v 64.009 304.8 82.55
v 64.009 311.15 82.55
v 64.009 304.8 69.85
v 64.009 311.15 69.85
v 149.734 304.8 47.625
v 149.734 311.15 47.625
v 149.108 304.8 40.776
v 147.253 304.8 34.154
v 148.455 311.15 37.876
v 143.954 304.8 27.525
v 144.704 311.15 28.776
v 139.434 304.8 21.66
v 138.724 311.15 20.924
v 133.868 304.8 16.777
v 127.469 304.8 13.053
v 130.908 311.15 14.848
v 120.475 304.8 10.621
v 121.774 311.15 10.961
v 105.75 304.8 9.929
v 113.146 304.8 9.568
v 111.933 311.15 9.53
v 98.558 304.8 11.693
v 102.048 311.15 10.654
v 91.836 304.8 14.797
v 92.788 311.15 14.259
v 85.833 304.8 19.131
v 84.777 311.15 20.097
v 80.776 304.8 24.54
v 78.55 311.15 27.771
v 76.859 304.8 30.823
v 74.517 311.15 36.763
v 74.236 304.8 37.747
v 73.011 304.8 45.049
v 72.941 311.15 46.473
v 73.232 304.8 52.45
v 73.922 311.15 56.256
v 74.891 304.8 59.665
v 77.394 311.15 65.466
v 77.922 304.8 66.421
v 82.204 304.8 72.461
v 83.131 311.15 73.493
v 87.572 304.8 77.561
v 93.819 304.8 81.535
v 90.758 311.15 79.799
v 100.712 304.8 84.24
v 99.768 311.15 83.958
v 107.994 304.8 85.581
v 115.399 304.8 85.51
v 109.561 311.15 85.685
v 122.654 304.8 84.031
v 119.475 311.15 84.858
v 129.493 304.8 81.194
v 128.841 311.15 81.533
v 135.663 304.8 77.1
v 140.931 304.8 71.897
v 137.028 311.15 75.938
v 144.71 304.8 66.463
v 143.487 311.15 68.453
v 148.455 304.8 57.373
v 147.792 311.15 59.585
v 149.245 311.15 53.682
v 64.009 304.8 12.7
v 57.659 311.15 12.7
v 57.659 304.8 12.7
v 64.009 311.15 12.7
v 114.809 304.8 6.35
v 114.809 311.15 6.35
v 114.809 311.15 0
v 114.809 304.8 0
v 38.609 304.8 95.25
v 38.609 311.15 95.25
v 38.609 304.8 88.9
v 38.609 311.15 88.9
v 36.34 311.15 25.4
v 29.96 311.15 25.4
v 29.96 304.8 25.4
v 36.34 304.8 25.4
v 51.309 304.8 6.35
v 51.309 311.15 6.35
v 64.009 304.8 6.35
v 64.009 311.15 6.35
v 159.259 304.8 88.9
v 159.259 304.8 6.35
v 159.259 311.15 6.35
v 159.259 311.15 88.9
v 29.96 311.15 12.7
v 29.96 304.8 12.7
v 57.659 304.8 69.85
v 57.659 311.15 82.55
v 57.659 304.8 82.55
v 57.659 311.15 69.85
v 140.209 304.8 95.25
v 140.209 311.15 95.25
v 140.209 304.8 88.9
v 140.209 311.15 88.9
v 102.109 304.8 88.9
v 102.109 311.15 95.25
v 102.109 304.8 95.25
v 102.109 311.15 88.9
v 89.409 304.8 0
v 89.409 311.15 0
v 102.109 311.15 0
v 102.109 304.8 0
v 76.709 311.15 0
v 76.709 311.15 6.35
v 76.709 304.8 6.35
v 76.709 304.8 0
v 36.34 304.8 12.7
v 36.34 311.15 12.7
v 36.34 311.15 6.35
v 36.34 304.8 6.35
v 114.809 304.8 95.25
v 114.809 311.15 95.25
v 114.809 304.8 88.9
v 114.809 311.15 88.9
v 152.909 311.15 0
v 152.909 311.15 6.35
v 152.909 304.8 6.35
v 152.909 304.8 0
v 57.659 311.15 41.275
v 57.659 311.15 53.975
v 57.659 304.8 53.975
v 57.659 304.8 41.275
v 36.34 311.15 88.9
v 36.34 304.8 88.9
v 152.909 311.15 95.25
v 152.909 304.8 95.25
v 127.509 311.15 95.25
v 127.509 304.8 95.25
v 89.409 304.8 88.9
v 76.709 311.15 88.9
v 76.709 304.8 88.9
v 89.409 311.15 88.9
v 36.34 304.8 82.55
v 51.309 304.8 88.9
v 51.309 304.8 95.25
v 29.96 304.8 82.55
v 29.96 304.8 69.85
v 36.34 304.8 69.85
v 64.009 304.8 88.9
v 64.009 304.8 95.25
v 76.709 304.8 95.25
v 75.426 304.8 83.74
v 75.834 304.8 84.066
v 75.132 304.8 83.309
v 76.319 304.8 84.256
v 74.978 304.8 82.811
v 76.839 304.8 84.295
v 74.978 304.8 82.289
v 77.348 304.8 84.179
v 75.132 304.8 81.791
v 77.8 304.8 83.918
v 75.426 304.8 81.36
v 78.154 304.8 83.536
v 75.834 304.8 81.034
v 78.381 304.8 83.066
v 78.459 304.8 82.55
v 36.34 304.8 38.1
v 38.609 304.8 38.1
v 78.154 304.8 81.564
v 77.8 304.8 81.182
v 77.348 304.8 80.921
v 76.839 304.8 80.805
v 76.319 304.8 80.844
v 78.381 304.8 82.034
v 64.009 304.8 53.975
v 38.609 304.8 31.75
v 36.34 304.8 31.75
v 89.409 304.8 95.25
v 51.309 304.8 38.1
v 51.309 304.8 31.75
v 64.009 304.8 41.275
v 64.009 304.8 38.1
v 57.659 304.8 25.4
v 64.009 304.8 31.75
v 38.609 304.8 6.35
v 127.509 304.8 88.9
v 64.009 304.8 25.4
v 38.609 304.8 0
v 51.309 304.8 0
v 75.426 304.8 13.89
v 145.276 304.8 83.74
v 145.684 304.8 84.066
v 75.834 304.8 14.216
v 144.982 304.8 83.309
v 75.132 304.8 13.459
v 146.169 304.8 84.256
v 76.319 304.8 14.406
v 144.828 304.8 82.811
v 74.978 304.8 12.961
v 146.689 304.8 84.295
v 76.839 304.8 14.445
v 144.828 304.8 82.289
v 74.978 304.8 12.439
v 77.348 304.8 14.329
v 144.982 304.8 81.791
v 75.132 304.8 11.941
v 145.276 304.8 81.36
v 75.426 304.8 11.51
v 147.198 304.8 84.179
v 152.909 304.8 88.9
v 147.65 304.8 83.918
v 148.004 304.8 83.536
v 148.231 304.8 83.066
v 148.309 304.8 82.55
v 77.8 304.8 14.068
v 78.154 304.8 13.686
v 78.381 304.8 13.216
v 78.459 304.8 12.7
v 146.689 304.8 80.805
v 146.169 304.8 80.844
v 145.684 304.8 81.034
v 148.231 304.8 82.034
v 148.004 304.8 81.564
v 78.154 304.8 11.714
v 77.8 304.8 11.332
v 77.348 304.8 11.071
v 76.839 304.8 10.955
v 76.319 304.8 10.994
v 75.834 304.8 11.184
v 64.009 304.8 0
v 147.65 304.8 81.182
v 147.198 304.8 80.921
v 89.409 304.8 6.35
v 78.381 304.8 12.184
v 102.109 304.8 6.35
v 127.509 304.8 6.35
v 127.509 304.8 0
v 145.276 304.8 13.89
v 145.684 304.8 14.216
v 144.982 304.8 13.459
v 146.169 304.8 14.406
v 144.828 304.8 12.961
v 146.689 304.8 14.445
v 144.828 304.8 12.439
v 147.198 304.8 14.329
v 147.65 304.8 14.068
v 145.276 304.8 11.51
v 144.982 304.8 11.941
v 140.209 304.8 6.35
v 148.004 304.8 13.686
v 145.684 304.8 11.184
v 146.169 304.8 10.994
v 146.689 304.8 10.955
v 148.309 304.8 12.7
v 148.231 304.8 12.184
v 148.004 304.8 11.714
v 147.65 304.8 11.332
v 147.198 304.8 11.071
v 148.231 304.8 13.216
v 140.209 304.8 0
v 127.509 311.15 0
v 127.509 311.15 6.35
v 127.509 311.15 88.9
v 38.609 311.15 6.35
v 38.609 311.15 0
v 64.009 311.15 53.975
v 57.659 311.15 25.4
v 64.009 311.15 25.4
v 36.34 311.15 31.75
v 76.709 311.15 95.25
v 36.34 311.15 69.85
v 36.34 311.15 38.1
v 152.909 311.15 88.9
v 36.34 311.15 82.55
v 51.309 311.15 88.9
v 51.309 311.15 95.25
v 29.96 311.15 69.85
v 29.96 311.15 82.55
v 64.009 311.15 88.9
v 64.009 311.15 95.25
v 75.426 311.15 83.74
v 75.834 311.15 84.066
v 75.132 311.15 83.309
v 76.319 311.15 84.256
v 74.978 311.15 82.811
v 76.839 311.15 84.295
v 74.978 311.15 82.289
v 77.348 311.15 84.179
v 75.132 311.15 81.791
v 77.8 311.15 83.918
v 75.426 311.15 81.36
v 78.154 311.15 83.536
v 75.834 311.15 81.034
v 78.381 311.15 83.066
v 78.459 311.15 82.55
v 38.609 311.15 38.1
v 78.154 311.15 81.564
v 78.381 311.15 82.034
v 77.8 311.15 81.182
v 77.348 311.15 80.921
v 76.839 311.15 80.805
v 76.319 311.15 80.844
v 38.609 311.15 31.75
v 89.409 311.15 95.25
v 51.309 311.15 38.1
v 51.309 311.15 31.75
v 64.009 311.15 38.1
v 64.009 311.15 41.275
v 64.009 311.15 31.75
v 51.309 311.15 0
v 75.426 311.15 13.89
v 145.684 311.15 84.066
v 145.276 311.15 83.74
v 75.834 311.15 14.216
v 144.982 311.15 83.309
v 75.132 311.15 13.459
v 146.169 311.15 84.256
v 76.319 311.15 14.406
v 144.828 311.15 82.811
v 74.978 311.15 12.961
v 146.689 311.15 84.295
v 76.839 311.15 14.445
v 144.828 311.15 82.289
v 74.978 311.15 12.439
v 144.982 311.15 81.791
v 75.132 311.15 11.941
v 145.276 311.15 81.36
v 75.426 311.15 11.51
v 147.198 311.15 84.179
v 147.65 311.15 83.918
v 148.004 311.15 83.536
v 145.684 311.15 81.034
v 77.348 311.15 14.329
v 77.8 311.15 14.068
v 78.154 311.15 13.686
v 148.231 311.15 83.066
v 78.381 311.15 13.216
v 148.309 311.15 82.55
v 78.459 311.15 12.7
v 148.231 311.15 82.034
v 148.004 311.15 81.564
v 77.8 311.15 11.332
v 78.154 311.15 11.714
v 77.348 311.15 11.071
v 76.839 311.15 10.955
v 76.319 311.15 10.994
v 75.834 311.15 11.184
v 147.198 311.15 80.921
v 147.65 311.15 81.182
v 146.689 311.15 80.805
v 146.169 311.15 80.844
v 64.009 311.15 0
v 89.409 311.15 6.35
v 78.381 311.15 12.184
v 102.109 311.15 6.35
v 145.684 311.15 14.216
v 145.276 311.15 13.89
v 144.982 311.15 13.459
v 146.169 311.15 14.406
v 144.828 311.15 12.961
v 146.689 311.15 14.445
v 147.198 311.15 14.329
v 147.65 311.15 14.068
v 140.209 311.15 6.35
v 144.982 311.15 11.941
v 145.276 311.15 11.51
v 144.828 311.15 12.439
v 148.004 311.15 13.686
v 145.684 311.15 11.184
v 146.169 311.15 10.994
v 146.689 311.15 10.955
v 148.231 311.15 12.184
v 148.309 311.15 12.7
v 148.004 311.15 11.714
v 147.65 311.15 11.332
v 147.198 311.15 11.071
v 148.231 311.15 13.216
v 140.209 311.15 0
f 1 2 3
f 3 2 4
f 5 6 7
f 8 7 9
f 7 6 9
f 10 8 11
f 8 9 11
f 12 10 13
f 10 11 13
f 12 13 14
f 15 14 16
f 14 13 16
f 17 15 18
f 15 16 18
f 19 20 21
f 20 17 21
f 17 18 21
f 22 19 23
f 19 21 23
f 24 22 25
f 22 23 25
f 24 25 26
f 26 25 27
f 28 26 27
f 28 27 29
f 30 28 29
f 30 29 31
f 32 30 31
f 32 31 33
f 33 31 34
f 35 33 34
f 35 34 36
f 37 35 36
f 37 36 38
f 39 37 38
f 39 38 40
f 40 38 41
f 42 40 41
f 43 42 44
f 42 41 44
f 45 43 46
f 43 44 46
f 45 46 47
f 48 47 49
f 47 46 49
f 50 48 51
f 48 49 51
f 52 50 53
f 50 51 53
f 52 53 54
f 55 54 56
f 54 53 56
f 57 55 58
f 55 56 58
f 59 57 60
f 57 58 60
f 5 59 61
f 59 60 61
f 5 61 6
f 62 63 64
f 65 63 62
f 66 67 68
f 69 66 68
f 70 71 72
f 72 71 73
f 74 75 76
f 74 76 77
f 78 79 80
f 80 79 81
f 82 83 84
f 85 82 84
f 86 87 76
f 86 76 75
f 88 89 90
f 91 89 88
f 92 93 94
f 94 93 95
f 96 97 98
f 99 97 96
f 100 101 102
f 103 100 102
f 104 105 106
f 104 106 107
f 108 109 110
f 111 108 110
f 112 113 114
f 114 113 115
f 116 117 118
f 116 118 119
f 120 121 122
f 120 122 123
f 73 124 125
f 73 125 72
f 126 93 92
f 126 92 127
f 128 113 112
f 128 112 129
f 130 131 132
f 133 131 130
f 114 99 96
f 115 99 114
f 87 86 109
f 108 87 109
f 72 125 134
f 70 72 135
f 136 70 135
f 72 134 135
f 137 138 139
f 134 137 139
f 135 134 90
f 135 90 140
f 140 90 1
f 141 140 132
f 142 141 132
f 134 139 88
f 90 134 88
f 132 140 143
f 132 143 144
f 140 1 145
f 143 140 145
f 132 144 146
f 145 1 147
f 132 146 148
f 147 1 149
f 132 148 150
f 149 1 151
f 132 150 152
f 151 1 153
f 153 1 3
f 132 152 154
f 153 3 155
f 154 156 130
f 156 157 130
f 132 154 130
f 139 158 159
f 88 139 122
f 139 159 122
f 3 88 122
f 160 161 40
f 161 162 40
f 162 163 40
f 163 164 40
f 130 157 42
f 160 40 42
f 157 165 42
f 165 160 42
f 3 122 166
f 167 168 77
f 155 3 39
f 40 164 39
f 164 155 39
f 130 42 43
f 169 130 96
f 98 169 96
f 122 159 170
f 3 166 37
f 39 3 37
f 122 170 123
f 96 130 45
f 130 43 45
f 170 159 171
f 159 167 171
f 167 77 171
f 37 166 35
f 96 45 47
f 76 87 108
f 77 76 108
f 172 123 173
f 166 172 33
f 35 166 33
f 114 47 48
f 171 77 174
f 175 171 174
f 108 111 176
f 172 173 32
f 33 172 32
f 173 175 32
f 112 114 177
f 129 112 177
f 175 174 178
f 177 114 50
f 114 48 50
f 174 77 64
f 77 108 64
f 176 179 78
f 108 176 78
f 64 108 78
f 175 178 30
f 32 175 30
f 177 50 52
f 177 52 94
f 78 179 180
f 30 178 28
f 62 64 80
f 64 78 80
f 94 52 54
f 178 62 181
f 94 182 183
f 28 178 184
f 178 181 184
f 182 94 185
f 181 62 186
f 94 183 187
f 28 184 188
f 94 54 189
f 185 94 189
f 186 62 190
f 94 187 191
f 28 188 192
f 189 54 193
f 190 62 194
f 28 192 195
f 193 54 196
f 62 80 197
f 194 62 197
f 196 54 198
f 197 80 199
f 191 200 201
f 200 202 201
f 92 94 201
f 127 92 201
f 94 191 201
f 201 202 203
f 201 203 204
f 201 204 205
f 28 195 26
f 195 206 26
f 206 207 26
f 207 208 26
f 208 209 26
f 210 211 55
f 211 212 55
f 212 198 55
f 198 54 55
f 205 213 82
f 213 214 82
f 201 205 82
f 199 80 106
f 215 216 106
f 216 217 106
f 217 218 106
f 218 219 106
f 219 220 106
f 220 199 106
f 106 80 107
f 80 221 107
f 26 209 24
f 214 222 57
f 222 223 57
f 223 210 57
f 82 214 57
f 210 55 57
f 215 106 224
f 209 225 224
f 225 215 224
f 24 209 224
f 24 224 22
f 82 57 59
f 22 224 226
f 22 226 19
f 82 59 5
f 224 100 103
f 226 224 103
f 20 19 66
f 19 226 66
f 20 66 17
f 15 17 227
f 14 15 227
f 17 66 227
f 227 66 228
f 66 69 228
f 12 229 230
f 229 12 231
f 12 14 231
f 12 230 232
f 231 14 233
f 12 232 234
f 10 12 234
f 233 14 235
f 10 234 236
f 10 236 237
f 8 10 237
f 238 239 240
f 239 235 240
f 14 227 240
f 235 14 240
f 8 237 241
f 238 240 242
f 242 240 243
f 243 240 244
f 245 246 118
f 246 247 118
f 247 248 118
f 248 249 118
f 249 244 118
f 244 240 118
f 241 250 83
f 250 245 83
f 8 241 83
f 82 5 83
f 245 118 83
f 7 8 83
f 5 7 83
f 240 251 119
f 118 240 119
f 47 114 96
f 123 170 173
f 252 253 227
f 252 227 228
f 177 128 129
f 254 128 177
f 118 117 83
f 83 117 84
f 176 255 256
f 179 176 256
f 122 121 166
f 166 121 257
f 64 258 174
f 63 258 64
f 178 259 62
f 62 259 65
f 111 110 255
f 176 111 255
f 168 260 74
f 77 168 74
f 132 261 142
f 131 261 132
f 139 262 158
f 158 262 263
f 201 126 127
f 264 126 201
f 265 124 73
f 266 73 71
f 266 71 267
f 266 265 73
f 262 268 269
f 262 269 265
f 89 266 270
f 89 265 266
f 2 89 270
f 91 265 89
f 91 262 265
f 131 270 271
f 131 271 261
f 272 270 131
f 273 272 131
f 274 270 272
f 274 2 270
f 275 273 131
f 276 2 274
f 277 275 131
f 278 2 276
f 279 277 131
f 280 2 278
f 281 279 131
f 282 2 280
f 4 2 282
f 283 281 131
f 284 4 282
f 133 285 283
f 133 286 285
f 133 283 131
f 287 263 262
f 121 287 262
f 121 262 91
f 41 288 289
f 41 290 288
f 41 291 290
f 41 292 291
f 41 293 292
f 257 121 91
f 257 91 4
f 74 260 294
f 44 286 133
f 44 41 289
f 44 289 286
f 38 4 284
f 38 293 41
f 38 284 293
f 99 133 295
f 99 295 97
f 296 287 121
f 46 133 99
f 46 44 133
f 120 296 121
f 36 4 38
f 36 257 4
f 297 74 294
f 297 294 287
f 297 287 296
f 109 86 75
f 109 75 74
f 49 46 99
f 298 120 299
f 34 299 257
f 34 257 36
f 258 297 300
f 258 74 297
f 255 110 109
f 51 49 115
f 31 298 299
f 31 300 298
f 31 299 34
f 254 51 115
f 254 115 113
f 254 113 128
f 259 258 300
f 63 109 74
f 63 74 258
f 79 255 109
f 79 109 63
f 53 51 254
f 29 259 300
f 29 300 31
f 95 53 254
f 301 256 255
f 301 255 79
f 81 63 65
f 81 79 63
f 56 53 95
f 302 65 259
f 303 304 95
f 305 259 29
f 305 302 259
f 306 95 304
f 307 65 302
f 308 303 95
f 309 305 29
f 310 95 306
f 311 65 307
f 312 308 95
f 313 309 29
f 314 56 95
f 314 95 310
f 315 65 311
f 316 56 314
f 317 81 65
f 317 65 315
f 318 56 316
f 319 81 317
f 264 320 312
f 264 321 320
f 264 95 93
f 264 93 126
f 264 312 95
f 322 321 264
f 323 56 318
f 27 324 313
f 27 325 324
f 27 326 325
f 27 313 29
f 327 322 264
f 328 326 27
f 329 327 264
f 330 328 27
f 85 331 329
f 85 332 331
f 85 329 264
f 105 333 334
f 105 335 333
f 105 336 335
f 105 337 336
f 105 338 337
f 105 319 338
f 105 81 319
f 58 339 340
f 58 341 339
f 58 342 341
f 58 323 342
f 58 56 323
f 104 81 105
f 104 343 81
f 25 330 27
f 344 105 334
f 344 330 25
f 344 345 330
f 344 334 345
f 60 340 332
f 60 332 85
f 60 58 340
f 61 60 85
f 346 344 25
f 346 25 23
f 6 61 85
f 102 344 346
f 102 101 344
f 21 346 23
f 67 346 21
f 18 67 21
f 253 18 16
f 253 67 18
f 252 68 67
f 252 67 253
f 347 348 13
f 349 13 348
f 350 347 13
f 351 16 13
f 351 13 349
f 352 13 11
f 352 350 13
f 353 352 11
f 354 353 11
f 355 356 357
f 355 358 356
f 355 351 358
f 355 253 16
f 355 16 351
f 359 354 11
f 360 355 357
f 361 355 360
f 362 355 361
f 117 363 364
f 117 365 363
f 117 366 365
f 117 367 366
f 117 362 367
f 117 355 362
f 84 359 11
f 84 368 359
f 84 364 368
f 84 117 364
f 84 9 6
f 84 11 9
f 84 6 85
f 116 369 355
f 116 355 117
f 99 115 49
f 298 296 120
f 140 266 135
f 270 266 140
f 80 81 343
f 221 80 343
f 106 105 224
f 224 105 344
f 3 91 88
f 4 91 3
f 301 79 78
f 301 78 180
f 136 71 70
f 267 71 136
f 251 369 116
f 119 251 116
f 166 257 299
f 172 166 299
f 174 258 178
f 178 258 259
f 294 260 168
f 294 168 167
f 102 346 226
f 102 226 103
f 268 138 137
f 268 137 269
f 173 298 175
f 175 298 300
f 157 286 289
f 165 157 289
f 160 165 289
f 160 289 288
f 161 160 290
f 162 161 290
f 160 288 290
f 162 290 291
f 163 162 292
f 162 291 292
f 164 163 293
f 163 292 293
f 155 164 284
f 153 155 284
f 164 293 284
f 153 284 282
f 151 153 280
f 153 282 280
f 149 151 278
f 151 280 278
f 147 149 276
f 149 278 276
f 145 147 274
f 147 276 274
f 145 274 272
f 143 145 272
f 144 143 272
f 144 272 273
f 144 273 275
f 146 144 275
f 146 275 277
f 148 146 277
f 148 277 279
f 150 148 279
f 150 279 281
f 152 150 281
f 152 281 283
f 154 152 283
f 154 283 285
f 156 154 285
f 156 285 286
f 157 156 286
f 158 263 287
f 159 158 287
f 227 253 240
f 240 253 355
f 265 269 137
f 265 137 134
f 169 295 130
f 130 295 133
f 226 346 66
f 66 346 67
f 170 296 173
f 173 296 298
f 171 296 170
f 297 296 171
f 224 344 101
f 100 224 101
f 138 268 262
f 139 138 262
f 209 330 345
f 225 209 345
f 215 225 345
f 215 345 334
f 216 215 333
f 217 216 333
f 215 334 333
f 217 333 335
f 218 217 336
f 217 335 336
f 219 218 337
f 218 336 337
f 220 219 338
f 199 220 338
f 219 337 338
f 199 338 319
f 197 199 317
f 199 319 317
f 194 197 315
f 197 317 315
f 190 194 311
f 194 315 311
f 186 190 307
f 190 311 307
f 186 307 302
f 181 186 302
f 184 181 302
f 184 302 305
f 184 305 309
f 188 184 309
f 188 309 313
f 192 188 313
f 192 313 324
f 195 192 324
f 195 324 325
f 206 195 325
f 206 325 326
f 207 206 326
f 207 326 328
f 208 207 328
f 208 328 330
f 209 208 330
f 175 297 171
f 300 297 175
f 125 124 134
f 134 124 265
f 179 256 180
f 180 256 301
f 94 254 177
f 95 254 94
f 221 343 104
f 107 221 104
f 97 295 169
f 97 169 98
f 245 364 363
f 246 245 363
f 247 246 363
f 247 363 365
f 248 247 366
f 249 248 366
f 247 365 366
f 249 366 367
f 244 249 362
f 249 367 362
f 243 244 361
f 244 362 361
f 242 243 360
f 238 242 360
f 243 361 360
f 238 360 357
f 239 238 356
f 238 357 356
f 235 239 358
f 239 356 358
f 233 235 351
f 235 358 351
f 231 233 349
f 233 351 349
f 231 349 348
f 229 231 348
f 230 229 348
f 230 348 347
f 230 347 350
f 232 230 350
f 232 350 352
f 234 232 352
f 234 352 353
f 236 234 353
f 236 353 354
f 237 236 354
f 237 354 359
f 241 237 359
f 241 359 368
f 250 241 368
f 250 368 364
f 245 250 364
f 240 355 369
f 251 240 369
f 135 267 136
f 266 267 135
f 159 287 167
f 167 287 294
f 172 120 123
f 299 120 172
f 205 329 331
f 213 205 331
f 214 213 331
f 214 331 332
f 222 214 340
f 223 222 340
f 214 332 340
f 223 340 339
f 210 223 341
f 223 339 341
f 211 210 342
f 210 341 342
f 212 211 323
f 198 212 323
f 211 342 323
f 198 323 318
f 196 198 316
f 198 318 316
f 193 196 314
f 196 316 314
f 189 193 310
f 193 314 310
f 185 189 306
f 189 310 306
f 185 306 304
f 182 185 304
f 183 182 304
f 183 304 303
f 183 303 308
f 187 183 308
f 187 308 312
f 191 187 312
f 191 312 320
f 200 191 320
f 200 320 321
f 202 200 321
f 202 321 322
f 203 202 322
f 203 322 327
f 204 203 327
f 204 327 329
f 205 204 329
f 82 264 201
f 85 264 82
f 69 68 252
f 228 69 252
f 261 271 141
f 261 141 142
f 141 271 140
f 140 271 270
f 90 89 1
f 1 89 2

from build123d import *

# Parameters (mm, degrees)
SKETCH5_W           = 129.298204438
SKETCH5_H           = 6.35
BOSS_EXTRUDE1_DEPTH = 95.25
SKETCH6_R           = 1.75
SKETCH6_RX          = 38.405174548
SKETCH6_RY          = 38.1
CUT_EXTRUDE3_DEPTH  = 7.35
SKETCH7_W           = 12.7
SKETCH7_H           = 6.35
CUT_EXTRUDE4_DEPTH  = 7.3500001
LPATTERN1_COUNT     = 17
LPATTERN1_PITCH     = 25.4
SKETCH8_W           = 12.7
SKETCH8_H           = 6.35
CUT_EXTRUDE5_DEPTH  = 7.3500001
SKETCH9_W           = 6.35
SKETCH9_H           = 12.7
CUT_EXTRUDE6_DEPTH  = 7.3500001
SKETCH10_W          = 6.379369351
SKETCH10_H          = 6.35
SKETCH10_H_2        = 44.45
CUT_EXTRUDE7_DEPTH  = 7.3500001


with BuildPart() as part:
    # Sketch5 → Boss-Extrude1 (new body)
    with BuildSketch(Plane.XY):
        with Locations((94.609439566, 307.975)):
            Rectangle(SKETCH5_W, SKETCH5_H)
    extrude(amount=BOSS_EXTRUDE1_DEPTH)

    # Sketch6 → Cut-Extrude3 (cut, through all)
    with BuildSketch(Plane(origin=(0, 311.15, 0), x_dir=(1, 0, 0), z_dir=(0, 1, 0))):
        with Locations((76.708541785, -12.7)):
            Circle(SKETCH6_R)
        with Locations((76.708541785, -82.55)):
            Circle(SKETCH6_R)
        with Locations((146.558541785, -82.55)):
            Circle(SKETCH6_R)
        with Locations((146.558541785, -12.7)):
            Circle(SKETCH6_R)
        with Locations((111.328367236, -47.625)):
            Ellipse(SKETCH6_RX, SKETCH6_RY)
    extrude(amount=-CUT_EXTRUDE3_DEPTH, mode=Mode.SUBTRACT)

    # Sketch7 → Cut-Extrude4 (cut, through all)
    with BuildSketch(Plane(origin=(0, 311.15, 0), x_dir=(1, 0, 0), z_dir=(0, 1, 0))):
        with Locations((159.258541785, -3.175)):
            Rectangle(SKETCH7_W, SKETCH7_H)
        with Locations((159.258541785, -92.075)):
            Rectangle(SKETCH7_W, SKETCH7_H)
    cut_extrude4 = extrude(amount=-CUT_EXTRUDE4_DEPTH, mode=Mode.SUBTRACT)

    # LPattern1: Cut-Extrude4 ×17
    with Locations(*[(-i * LPATTERN1_PITCH, 0, 0) for i in range(1, LPATTERN1_COUNT)]):
        add(cut_extrude4, mode=Mode.SUBTRACT)

    # Sketch8 → Cut-Extrude5 (cut, through all)
    with BuildSketch(Plane(origin=(0, 311.15, 0), x_dir=(1, 0, 0), z_dir=(0, 1, 0))):
        with Locations((32.258541785, -34.925)):
            Rectangle(SKETCH8_W, SKETCH8_H)
        with Locations((57.658541785, -34.925)):
            Rectangle(SKETCH8_W, SKETCH8_H)
    extrude(amount=-CUT_EXTRUDE5_DEPTH, mode=Mode.SUBTRACT)

    # Sketch9 → Cut-Extrude6 (cut, through all)
    with BuildSketch(Plane(origin=(0, 311.15, 0), x_dir=(1, 0, 0), z_dir=(0, 1, 0))):
        with Locations((60.833541785, -47.625)):
            Rectangle(SKETCH9_W, SKETCH9_H)
        with Locations((60.833541785, -19.05)):
            Rectangle(SKETCH9_W, SKETCH9_H)
        with Locations((60.833541785, -76.2)):
            Rectangle(SKETCH9_W, SKETCH9_H)
    extrude(amount=-CUT_EXTRUDE6_DEPTH, mode=Mode.SUBTRACT)

    # Sketch10 → Cut-Extrude7 (cut, through all)
    with BuildSketch(Plane(origin=(0, 311.15, 0), x_dir=(1, 0, 0), z_dir=(0, 1, 0))):
        with Locations((33.150022023, -9.525)):
            Rectangle(SKETCH10_W, SKETCH10_H)
        with Locations((33.150022023, -47.625)):
            Rectangle(SKETCH10_W, SKETCH10_H_2)
        with Locations((33.150022023, -85.725)):
            Rectangle(SKETCH10_W, SKETCH10_H)
    extrude(amount=-CUT_EXTRUDE7_DEPTH, mode=Mode.SUBTRACT)


solid = part.part
